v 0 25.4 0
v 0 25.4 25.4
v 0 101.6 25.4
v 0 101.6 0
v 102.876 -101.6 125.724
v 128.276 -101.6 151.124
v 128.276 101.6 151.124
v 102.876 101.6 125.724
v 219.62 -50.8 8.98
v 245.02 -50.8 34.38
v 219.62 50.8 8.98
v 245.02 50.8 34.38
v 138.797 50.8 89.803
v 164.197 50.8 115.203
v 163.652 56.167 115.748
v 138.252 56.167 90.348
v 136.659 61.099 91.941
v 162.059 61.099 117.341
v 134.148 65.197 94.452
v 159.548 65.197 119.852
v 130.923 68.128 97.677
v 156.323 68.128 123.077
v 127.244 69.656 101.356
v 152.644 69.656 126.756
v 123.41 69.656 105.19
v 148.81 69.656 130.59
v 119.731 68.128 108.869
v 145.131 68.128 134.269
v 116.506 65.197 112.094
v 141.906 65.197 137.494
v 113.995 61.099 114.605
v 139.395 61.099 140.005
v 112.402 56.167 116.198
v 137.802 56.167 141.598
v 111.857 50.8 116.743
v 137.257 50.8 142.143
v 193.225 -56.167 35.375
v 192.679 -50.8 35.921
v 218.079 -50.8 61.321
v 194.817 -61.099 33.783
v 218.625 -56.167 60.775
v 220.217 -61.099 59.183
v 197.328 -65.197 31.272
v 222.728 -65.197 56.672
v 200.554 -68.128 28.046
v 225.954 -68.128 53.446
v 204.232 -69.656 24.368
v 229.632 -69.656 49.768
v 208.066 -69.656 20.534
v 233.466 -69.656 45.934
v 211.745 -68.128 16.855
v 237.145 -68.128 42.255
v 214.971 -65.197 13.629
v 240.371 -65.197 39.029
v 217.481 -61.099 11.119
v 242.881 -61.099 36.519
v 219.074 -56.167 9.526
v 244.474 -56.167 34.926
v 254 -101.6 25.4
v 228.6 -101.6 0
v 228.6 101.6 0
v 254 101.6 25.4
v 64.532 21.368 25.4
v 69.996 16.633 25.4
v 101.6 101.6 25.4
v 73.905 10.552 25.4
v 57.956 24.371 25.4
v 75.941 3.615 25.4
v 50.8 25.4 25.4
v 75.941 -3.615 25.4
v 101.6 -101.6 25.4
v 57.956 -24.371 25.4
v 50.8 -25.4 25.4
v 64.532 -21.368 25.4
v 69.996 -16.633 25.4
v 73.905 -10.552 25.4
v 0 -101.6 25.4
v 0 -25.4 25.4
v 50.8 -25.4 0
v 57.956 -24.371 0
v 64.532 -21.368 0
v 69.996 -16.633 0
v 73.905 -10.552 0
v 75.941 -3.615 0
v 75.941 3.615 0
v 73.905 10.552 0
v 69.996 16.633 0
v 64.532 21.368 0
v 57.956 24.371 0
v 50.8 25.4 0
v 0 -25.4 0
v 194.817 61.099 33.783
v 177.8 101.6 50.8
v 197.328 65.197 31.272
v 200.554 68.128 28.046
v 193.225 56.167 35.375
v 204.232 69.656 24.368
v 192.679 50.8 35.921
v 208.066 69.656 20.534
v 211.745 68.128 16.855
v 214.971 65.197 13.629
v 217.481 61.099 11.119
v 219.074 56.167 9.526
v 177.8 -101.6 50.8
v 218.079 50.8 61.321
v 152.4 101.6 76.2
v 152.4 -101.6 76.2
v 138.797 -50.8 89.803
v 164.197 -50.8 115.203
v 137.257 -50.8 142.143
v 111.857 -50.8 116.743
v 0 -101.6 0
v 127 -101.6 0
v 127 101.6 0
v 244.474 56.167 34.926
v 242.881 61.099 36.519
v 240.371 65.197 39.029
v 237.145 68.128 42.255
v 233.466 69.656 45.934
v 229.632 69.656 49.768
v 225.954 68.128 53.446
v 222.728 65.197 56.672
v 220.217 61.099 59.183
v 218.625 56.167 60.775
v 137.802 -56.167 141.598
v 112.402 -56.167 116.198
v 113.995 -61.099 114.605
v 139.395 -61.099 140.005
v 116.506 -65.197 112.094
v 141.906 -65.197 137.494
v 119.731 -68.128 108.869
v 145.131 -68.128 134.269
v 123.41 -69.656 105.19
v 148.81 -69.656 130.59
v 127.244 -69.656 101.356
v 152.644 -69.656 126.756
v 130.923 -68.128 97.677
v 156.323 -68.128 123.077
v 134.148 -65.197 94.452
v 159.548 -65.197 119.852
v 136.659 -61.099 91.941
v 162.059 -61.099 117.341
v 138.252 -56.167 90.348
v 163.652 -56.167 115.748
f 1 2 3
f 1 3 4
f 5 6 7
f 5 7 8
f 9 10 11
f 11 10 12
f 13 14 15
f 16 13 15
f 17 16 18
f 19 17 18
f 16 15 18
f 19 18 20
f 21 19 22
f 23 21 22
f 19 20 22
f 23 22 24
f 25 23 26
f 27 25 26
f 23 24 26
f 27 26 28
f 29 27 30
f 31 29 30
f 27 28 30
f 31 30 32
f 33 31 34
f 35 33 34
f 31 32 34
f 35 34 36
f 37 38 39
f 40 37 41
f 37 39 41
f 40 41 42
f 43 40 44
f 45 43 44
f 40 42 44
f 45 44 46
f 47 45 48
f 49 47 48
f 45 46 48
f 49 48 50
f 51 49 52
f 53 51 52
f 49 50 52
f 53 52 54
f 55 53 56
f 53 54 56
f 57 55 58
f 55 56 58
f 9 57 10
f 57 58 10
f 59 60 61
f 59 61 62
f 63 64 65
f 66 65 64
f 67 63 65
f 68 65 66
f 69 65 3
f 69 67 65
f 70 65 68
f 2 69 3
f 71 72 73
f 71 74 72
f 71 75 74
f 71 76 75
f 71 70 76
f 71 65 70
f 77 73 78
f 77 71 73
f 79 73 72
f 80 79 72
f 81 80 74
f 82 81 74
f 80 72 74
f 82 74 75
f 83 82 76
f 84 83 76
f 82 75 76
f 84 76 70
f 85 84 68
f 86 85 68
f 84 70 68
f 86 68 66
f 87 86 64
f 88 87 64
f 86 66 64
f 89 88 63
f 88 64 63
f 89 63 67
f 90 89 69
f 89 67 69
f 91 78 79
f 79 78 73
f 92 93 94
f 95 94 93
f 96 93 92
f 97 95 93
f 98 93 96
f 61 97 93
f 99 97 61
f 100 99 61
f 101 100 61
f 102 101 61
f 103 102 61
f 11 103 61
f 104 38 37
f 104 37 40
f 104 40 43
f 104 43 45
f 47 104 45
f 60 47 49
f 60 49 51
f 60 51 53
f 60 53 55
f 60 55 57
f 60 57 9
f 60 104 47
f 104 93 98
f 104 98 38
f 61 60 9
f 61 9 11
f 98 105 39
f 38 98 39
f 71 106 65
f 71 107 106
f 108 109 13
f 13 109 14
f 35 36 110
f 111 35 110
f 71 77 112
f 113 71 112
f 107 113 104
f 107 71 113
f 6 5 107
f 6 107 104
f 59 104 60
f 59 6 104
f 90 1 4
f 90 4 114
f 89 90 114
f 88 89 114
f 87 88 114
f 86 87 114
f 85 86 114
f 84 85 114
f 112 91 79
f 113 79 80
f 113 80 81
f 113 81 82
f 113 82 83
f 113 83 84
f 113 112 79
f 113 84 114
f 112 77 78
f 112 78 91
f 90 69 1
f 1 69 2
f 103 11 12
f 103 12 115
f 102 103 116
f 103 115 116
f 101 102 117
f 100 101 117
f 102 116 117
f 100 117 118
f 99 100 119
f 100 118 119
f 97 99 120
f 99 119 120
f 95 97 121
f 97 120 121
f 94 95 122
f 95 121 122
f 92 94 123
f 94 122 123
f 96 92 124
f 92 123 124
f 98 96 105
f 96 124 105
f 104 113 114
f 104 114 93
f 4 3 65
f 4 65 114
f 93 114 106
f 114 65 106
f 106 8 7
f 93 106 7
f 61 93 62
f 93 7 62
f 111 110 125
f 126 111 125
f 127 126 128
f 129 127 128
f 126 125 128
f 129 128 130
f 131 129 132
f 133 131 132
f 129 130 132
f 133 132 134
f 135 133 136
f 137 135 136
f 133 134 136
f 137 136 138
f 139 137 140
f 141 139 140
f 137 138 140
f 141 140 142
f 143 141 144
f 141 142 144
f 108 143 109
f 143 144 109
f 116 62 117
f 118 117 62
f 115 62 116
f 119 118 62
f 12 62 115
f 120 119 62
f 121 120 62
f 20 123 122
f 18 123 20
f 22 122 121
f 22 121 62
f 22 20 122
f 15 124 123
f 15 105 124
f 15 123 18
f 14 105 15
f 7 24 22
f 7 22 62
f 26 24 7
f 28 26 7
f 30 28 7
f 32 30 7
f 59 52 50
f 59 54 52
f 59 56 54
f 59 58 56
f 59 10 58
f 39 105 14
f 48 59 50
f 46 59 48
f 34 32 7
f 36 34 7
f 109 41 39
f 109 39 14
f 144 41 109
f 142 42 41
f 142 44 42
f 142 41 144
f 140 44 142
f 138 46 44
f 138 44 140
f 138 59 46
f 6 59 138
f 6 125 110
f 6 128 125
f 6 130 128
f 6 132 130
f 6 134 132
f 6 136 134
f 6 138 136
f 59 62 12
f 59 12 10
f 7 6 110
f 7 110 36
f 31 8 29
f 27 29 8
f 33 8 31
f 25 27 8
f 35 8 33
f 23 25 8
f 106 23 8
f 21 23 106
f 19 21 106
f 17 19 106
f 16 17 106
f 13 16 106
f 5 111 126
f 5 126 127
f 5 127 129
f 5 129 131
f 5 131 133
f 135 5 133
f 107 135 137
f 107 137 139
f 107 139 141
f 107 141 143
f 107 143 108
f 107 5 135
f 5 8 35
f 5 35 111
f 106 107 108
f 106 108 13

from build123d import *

# Parameters (mm, degrees)
F1_DEPTH = 101.6
F3_DEPTH = 38.1
F5_DEPTH = 25.4


with BuildPart() as f1:
    # F0 (on Front) → F1 (new body, symmetric)
    with BuildSketch(Plane.XZ):
        Polygon((0, 25.4), (0, 0), (127, 0), (177.8, 50.8), (228.6, 0), (254, 25.4), (128.276414, 151.123586), (102.876414, 125.723586), (152.4, 76.2), (101.6, 25.4), align=None)
    extrude(amount=F1_DEPTH, both=True)

    # F2 (on face) → F3 (cut)
    with BuildSketch(Plane(origin=(139.7, 0, 139.7), x_dir=(0, 1, 0), z_dir=(0.707107, 0, 0.707107))):
        with BuildLine():
            Line((50.8, 3.45539), (-50.8, 3.45539))
            ThreePointArc((-50.8, 3.45539), (-69.85, -15.59461), (-50.8, -34.64461))
            Line((-50.8, -34.64461), (50.8, -34.64461))
            ThreePointArc((50.8, -34.64461), (69.85, -15.59461), (50.8, 3.45539))
        make_face()
        with BuildLine():
            ThreePointArc((-50.8, -110.84461), (-69.85, -129.89461), (-50.8, -148.94461))
            Line((-50.8, -148.94461), (50.8, -148.94461))
            ThreePointArc((50.8, -148.94461), (69.85, -129.89461), (50.8, -110.84461))
            Line((50.8, -110.84461), (-50.8, -110.84461))
        make_face()
    extrude(amount=-F3_DEPTH, mode=Mode.SUBTRACT)

    # F4 (on face) → F5 (cut)
    with BuildSketch(Plane.XY.offset(25.4)):
        with BuildLine():
            Line((0, -25.4), (50.8, -25.4))
            ThreePointArc((50.8, -25.4), (76.2, 0), (50.8, 25.4))
            Line((50.8, 25.4), (0, 25.4))
            Line((0, 25.4), (0, -25.4))
        make_face()
    extrude(amount=-F5_DEPTH, mode=Mode.SUBTRACT)


solid = f1.part
